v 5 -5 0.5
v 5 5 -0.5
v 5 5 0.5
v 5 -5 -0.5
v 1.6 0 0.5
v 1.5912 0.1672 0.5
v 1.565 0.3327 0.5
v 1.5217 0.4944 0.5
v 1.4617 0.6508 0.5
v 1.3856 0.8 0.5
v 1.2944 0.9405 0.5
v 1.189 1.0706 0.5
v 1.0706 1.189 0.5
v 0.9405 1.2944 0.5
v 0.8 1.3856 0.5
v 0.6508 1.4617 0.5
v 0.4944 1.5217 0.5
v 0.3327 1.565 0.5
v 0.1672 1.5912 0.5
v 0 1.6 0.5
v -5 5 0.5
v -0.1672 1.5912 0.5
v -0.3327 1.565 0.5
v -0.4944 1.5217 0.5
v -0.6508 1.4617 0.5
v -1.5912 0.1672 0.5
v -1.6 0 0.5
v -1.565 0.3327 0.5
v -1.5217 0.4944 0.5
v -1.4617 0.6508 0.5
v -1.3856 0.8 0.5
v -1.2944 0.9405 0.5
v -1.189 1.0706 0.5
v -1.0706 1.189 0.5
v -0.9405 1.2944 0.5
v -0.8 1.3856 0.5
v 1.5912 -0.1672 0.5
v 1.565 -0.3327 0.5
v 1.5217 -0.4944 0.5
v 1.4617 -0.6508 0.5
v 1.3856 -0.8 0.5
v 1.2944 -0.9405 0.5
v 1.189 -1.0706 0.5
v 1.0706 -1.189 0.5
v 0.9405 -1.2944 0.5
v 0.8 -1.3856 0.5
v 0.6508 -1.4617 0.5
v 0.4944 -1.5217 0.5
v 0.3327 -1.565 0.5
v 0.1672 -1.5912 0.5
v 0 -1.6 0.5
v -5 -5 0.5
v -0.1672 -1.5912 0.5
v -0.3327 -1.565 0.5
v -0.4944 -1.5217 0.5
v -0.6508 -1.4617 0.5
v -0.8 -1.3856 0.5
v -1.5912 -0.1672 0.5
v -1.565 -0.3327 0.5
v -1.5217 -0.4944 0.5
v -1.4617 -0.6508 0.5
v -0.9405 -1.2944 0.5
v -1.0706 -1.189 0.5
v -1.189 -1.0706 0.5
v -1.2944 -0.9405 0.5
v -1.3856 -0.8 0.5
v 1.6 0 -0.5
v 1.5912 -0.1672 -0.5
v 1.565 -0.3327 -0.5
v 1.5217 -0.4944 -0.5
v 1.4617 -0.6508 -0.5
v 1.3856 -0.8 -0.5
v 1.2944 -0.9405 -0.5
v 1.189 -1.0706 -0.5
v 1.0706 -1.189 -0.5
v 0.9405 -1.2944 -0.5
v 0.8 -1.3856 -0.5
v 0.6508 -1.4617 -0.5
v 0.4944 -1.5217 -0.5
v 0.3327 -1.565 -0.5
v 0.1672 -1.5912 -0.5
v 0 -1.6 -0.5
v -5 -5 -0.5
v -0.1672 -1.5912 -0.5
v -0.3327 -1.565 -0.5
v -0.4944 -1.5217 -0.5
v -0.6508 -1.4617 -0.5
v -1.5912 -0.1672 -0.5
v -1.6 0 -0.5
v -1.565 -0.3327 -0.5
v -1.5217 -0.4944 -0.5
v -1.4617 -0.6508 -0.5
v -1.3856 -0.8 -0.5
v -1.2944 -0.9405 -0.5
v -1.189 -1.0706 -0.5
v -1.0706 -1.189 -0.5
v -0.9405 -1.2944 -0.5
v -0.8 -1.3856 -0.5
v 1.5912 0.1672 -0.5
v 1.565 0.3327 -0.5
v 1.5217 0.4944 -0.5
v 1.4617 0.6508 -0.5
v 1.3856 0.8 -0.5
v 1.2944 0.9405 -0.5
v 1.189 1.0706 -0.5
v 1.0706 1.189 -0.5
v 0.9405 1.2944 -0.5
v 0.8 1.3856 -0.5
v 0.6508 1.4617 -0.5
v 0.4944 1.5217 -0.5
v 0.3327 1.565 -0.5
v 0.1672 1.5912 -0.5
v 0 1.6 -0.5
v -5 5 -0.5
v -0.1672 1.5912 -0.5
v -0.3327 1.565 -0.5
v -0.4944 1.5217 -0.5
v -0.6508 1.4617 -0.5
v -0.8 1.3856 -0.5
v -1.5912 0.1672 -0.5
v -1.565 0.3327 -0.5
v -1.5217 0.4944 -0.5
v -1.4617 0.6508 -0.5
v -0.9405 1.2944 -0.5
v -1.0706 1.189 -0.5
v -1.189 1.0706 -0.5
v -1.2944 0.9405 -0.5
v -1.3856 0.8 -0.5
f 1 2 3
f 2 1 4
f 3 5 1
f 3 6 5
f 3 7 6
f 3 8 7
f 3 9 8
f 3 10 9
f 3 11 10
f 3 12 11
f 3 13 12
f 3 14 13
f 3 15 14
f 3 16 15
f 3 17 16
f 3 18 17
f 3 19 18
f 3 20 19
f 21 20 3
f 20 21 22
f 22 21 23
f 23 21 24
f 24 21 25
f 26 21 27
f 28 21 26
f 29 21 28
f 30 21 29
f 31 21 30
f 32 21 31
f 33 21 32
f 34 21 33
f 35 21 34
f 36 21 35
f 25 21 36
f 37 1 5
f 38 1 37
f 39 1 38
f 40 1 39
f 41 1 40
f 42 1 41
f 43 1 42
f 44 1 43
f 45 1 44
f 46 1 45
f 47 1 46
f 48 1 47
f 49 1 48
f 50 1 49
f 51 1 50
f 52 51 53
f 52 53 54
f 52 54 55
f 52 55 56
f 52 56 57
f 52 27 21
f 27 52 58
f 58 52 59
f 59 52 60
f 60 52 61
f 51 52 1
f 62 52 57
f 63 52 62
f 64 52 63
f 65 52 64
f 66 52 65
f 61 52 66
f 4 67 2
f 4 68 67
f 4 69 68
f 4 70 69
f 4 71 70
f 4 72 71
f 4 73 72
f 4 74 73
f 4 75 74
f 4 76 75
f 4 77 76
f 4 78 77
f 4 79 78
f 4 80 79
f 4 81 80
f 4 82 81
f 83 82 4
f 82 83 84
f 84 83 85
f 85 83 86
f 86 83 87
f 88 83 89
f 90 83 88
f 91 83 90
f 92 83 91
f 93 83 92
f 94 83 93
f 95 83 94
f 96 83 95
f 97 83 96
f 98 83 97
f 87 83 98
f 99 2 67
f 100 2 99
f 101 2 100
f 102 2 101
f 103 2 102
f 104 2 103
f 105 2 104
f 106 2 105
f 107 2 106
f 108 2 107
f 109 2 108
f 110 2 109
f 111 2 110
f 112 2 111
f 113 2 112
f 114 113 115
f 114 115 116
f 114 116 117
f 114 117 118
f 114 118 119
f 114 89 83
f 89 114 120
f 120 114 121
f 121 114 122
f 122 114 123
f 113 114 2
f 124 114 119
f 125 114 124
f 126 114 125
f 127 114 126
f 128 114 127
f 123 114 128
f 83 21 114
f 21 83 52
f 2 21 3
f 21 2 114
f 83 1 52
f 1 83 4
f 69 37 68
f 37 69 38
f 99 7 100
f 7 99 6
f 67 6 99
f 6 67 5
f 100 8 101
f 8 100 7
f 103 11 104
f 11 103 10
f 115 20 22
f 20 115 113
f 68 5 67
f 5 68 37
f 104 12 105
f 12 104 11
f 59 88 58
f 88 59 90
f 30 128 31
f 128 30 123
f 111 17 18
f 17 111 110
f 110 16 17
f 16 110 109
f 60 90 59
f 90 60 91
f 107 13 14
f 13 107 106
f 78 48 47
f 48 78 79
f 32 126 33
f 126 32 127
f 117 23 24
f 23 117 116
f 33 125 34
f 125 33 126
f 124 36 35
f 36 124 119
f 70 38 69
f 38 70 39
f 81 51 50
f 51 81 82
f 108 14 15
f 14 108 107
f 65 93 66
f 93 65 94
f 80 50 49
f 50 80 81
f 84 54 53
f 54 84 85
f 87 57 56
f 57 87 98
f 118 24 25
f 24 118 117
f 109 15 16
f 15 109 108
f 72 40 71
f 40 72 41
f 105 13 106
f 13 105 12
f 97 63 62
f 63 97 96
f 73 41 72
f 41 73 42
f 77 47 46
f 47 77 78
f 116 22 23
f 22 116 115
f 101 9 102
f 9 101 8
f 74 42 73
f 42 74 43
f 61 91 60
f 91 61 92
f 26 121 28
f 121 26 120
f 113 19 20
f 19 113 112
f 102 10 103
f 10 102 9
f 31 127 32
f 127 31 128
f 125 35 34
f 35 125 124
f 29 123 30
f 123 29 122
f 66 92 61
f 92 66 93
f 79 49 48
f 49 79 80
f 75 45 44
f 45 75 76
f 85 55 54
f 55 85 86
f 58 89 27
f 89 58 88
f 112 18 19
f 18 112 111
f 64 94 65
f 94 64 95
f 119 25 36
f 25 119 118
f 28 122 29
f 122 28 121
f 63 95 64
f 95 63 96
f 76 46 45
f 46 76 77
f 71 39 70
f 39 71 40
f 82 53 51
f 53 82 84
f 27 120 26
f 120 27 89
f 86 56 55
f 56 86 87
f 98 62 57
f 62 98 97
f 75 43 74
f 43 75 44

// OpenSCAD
// Square mounting washer.
$fn = 60;
eps = 0.02;
hole_d = 3.2;
side = 10;
thickness = 1;
difference() {
    cube([side,side,thickness],center=true);
    translate([0,0,-thickness/2-eps]) cylinder(d=hole_d,h=thickness+2*eps);
}
